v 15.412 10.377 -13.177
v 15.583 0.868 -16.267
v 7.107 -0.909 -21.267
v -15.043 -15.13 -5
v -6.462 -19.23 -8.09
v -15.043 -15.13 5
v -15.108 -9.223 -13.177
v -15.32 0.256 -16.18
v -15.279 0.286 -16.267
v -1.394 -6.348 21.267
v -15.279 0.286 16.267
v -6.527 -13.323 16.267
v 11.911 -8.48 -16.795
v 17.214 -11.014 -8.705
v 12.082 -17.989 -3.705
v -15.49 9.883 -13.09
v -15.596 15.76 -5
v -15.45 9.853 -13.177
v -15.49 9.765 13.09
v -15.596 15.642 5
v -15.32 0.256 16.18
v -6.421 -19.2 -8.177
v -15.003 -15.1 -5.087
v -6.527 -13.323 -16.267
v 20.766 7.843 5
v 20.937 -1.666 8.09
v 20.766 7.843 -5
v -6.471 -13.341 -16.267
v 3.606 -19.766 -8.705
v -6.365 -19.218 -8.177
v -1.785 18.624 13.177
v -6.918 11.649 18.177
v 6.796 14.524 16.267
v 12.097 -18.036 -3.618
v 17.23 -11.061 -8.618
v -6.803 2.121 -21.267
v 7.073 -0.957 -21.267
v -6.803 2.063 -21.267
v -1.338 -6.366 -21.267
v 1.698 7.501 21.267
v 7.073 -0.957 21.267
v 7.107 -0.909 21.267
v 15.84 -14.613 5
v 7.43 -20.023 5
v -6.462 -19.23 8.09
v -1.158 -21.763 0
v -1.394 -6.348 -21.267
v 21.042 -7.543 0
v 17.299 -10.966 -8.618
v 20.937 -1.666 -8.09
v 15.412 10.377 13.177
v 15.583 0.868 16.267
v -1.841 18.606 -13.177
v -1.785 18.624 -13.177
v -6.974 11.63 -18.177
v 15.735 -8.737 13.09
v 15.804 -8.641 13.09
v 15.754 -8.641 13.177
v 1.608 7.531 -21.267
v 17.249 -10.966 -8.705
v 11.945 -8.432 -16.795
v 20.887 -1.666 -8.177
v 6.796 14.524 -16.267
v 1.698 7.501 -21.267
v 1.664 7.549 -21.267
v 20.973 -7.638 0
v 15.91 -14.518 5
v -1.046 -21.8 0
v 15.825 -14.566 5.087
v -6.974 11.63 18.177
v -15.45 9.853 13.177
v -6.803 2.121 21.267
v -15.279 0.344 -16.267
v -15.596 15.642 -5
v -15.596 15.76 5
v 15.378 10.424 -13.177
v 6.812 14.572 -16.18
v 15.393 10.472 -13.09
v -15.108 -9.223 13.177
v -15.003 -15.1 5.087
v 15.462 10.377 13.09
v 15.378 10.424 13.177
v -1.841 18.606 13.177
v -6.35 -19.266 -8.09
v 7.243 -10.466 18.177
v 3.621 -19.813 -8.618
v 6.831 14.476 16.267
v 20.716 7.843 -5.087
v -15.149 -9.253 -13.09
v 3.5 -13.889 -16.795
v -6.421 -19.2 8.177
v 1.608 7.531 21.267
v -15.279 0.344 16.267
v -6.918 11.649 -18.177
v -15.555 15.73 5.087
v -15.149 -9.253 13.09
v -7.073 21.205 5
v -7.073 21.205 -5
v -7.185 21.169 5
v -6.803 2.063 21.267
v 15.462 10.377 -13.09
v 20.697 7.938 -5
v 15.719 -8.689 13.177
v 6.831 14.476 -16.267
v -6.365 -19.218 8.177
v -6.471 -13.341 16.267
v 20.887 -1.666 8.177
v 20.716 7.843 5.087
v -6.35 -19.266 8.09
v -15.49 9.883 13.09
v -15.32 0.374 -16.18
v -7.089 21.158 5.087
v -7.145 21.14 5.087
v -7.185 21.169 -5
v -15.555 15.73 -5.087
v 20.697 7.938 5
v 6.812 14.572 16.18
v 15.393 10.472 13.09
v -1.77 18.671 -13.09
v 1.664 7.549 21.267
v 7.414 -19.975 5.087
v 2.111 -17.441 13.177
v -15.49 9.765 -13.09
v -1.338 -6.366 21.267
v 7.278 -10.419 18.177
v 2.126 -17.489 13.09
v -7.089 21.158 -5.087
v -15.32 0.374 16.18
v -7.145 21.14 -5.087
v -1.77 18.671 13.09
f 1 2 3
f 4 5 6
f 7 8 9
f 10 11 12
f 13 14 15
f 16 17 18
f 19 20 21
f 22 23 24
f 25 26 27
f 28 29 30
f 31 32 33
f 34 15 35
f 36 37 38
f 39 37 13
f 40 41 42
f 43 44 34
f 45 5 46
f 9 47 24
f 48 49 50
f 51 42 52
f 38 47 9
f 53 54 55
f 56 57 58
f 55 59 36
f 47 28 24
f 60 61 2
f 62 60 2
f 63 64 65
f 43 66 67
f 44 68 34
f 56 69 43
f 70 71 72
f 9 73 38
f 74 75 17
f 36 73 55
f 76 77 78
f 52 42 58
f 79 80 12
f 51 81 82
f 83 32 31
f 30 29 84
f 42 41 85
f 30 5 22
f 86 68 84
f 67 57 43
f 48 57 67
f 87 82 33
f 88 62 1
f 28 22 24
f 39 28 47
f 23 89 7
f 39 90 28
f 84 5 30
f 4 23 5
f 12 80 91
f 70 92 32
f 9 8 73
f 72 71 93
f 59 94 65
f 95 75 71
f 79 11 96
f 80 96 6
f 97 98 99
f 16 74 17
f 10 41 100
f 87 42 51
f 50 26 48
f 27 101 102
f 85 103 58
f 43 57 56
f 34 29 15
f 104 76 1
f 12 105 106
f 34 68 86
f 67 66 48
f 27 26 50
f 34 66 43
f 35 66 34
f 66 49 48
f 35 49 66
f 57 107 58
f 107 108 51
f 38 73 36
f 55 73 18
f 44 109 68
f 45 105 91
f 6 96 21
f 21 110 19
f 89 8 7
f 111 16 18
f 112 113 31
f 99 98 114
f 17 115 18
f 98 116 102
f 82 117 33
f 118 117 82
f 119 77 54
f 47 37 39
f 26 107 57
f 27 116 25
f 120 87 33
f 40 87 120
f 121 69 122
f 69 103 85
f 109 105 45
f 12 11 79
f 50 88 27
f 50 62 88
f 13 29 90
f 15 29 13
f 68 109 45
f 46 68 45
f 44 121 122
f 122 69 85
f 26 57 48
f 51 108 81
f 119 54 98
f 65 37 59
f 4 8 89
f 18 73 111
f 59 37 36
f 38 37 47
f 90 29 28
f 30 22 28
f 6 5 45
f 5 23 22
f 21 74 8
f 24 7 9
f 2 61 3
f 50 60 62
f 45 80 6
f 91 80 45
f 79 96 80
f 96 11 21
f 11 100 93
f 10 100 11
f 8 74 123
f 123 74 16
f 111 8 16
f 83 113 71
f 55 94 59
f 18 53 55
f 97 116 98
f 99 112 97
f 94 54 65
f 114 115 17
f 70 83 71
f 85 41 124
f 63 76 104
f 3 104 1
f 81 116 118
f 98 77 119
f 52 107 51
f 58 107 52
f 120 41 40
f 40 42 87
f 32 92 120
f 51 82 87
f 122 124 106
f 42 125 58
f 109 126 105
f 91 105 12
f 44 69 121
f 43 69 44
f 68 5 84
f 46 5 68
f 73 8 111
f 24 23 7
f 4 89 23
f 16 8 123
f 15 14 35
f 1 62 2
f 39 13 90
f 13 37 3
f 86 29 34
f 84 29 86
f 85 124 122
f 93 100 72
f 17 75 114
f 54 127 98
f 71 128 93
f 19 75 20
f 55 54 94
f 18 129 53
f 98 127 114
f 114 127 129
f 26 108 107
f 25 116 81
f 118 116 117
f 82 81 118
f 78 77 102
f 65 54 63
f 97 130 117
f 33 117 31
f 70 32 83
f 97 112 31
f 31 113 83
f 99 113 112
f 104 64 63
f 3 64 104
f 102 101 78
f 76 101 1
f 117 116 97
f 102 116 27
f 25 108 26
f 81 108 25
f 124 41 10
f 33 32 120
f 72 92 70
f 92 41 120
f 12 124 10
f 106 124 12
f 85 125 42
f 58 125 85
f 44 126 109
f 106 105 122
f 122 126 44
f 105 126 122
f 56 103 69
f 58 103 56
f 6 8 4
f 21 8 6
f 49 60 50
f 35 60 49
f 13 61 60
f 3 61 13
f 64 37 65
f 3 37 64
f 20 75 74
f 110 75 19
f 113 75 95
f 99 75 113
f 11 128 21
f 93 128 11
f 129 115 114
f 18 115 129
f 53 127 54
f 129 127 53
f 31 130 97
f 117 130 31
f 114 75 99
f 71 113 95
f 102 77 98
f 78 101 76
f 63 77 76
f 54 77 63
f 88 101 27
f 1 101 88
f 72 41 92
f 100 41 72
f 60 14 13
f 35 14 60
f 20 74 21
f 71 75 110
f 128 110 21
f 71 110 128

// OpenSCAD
// Auto-generated OpenSCAD file

    inner_points = 10*[[0.7057265485457351, -0.09094884907028836, -2.1180339887490542], [0.7057265485407271, -0.09094884906961656, 2.1180339887507356], [0.16480805396553816, 0.7501261667404855, -2.118033988749827], [0.16480805396053017, 0.7501261667411573, 2.118033988749963], [-0.13534846726503874, -0.6318673436504852, -2.118033988749963], [-0.13534846727004674, -0.6318673436498135, 2.118033988749827], [-0.6762669618452357, 0.20920767216028854, -2.1180339887507356], [-0.6762669618502437, 0.20920767216096034, 2.1180339887490542], [2.0666145112140093, 0.7842756603041526, -0.49999999999768924], [2.066614511212827, 0.7842756603043113, 0.5000000000023108], [-1.496236429937139, -1.5070918530244133, -0.5000000000015379], [-1.496236429938321, -1.5070918530242545, 0.4999999999984621], [1.189538758212475, -0.8432292128820578, -1.670820393248405], [1.5809510579168244, -1.4518368117400606, 0.5000000000020912], [-0.7104164554105592, 2.1110141294109295, -0.5000000000011826], [-0.7104164554117414, 2.111014129411088, 0.4999999999988174], [0.3484637424017012, -1.3841477074622546, -1.6708203932493135], [0.7398760421060506, -1.9927553063202574, 0.5000000000011826], [-1.551491471221333, 1.5700956348307327, -0.5000000000020912], [-1.5514914712225152, 1.570095634830891, 0.4999999999979088], [1.2066135049926328, -1.794132441507042, -0.36180339887328655], [0.7228012953227978, -1.0418520776948579, 1.809016994375959], [-0.6933417086273064, 1.16011090078553, -1.809016994375959], [-0.6933417086315835, 1.1601109007861032, 1.8090169943739358], [1.5362487904951605, 1.0376601608124174, -1.3090169943733039], [1.5362487904920659, 1.0376601608128326, 1.309016994376591], [-1.5067892037965744, -0.9194013377221607, -1.309016994376591], [-1.506789203799669, -0.9194013377217455, 1.3090169943733039], [2.0942420318555155, -0.7543180836233406, 2.587389943224604e-12], [-0.10772094662544573, -2.170461087577722, 2.0876308632757284e-13], [1.5533235372772314, 0.08675693218717659, -1.6180339887480804], [1.5533235372734056, 0.08675693218768951, 1.6180339887517095], [0.678099027903047, 1.447644894857364, -1.618033988749331], [0.6780990278992212, 1.4476448948578768, 1.618033988750459], [-0.6486394412037297, -1.3293860717672048, -1.618033988750459], [-0.6486394412075556, -1.3293860717666919, 1.618033988749331], [-1.5238639505779141, 0.031501890902982464, -1.6180339887517095], [-1.52386395058174, 0.03150189090349539, 1.6180339887480804], [2.08368925799608, -0.1666275683210884, -0.8090169943724658], [2.083689257994167, -0.16662756832083173, 0.8090169943774291], [-0.6380866673442945, -1.9170765870694573, -0.8090169943754059], [-0.6380866673462073, -1.9170765870692006, 0.809016994374489], [1.719904478931324, -1.0966137133903227, -0.8618033988727903], [1.5703982840554762, -0.8641462964375515, 1.309016994376933], [-0.1800507346897975, 1.857629628902408, -1.309016994375463], [-0.18005073469289257, 1.8576296289028231, 1.3090169943744319], [0.3590165162611366, -1.9718382227645073, -0.8618033988742605], [0.2095103213852889, -1.7393708058117359, 1.309016994375463], [-1.5409386973599848, 0.9824051195282235, -1.309016994376933], [-1.5409386973630799, 0.9824051195286387, 1.309016994372962]];

    outer_points = 10*[[1.2164351229694326, -0.4552393565390054, 1.81634542347101], [-1.8825899471092338, -0.5445384218729208, -1.070234075166359], [1.2010095010844373, 0.5445384218729208, 1.80197726481464], [-1.898015568994229, 0.4552393565390054, -1.0846022338227295], [1.898015568994229, -0.4552393565390054, 1.0846022338227295], [-1.2010095010844373, -0.5445384218729208, -1.80197726481464], [1.8825899471092338, 0.5445384218729208, 1.070234075166359], [-1.2164351229694326, 0.4552393565390054, -1.81634542347101], [-1.0701074495480267, -0.4893485643329636, 1.8977555181073444], [-1.8016880300626414, -0.5104292140789626, 1.2163265339716638], [1.817113651947637, -0.4893485643329636, -1.2019583753152931], [1.0855330714330222, -0.5104292140789626, -1.8833873594509738], [0.9030594368115687, -1.3588953396765044, 1.5244523891846673], [-0.6739085218196809, -2.12810364074632, 0.05558935114624375], [-0.007671924205115532, 2.12810364074632, 0.6761538385020369], [-0.7392525047197304, 2.107022991000321, -0.005275145633643785], [1.5846398828363653, -1.3588953396765044, 0.7927091995363865], [0.007671924205115532, -2.12810364074632, -0.6761538385020369], [0.6739085218196809, 2.12810364074632, -0.05558935114624375], [-0.05767205869493397, 2.107022991000321, -0.7370183352819244], [0.2986778374294102, -2.1953274817801613, 0.27820275819814366], [-1.3032493017093665, -1.34686135618262, -1.2139084489020384], [1.3032493017093665, 1.34686135618262, 1.2139084489020384], [-1.343634104101889, 1.2705908488966635, -1.2515247766201674], [-0.275339197244193, 0.02759492876997861, 2.2157379862851325], [-2.1906420225408336, -0.02759492876997861, 0.4317337448986074], [2.1906420225408336, 0.02759492876997861, -0.4317337448986074], [0.275339197244193, -0.02759492876997861, -2.2157379862851325], [-0.8642951747413561, -1.808614991745605, 0.9838565139549793], [0.920105599018874, -1.808614991745605, -0.9318720275804797], [0.3040014481556744, -0.7747280055397205, 2.072063612549453], [-2.0634430414083775, -0.842946421127637, -0.1330869019522355], [0.2790422676481473, 0.842946421127637, 2.0488154434876944], [-2.0884022219159046, 0.7747280055397205, -0.15633507101399402], [2.0884022219159046, -0.7747280055397205, 0.15633507101399402], [-0.2790422676481473, -0.842946421127637, -2.0488154434876944], [2.0634430414083775, 0.842946421127637, 0.1330869019522355], [-0.3040014481556744, 0.7747280055397205, -2.072063612549453], [-0.49076680414815965, -1.2916714986426625, 1.754081144371665], [-1.6744890489301856, -1.325780706436621, 0.6515058871208207], [1.714873851322708, -1.2916714986426625, -0.6138895594026917], [0.5311516065406822, -1.325780706436621, -1.7164648166535361], [0.1082911845077349, -1.8758388327794464, 1.2064699210068792], [-1.4841023960085102, -1.645269355437336, -0.27676127568791475], [0.3812820682730764, 1.645269355437336, 1.460746627575093], [-1.5340207570235642, 1.590079497897379, -0.3232576138114317], [1.2111115122431686, -1.8758388327794464, 0.02248456911970087], [-0.3812820682730764, -1.645269355437336, -1.460746627575093], [1.4841023960085102, 1.645269355437336, 0.27676127568791475], [-0.4312004292881303, 1.590079497897379, -1.5072429656986102]];

    // Convex hull for inner set (I)
    module inner_hull() {
        hull() {
            for (p = inner_points) {
                translate(p) sphere(r=0.1);
            }
        }
    }

    // Convex hull for outer set (O) minus inner hull (O \ I)
    module outer_minus_inner() {
        difference() {
            hull() {
                for (p = outer_points) {
                    translate(p) sphere(r=0.1);
                }
            }
            inner_hull(); // Subtract inner hull
        }
    }

    // Convex hull for outer set (O) minus all translated inner hulls
    module outer_minus_AllTranslationInner() {
        difference() {
            hull() {
                for (p = outer_points) {
                    translate(p) sphere(r=0.1);
                }
            }
            hull() {
                translate([0,0,50]) inner_hull();
                translate([0,0,-50]) inner_hull();
            }; // Subtract translated inner hulls
        }
    }

    // Difference between outer_minus_inner and outer_minus_AllTranslationInner
    module outer_minus_inner_diff() {
        difference() {
            // Outer minus inner
            difference() {
                hull() {
                    for (p = outer_points) {
                        translate(p) sphere(r=0.1);
                    }
                }
                inner_hull();
            }

            // Subtract Outer minus AllTranslationInner
            difference() {
                hull() {
                    for (p = outer_points) {
                        translate(p) sphere(r=0.1);
                    }
                }
                hull() {
                    translate([0,0,50]) inner_hull();
                    translate([0,0,-50]) inner_hull();
                };
            }
        }
    }

    // Rendering all with colors applied
    color([1, 0, 0, 0.5]) inner_hull(); // Transparent red
    
